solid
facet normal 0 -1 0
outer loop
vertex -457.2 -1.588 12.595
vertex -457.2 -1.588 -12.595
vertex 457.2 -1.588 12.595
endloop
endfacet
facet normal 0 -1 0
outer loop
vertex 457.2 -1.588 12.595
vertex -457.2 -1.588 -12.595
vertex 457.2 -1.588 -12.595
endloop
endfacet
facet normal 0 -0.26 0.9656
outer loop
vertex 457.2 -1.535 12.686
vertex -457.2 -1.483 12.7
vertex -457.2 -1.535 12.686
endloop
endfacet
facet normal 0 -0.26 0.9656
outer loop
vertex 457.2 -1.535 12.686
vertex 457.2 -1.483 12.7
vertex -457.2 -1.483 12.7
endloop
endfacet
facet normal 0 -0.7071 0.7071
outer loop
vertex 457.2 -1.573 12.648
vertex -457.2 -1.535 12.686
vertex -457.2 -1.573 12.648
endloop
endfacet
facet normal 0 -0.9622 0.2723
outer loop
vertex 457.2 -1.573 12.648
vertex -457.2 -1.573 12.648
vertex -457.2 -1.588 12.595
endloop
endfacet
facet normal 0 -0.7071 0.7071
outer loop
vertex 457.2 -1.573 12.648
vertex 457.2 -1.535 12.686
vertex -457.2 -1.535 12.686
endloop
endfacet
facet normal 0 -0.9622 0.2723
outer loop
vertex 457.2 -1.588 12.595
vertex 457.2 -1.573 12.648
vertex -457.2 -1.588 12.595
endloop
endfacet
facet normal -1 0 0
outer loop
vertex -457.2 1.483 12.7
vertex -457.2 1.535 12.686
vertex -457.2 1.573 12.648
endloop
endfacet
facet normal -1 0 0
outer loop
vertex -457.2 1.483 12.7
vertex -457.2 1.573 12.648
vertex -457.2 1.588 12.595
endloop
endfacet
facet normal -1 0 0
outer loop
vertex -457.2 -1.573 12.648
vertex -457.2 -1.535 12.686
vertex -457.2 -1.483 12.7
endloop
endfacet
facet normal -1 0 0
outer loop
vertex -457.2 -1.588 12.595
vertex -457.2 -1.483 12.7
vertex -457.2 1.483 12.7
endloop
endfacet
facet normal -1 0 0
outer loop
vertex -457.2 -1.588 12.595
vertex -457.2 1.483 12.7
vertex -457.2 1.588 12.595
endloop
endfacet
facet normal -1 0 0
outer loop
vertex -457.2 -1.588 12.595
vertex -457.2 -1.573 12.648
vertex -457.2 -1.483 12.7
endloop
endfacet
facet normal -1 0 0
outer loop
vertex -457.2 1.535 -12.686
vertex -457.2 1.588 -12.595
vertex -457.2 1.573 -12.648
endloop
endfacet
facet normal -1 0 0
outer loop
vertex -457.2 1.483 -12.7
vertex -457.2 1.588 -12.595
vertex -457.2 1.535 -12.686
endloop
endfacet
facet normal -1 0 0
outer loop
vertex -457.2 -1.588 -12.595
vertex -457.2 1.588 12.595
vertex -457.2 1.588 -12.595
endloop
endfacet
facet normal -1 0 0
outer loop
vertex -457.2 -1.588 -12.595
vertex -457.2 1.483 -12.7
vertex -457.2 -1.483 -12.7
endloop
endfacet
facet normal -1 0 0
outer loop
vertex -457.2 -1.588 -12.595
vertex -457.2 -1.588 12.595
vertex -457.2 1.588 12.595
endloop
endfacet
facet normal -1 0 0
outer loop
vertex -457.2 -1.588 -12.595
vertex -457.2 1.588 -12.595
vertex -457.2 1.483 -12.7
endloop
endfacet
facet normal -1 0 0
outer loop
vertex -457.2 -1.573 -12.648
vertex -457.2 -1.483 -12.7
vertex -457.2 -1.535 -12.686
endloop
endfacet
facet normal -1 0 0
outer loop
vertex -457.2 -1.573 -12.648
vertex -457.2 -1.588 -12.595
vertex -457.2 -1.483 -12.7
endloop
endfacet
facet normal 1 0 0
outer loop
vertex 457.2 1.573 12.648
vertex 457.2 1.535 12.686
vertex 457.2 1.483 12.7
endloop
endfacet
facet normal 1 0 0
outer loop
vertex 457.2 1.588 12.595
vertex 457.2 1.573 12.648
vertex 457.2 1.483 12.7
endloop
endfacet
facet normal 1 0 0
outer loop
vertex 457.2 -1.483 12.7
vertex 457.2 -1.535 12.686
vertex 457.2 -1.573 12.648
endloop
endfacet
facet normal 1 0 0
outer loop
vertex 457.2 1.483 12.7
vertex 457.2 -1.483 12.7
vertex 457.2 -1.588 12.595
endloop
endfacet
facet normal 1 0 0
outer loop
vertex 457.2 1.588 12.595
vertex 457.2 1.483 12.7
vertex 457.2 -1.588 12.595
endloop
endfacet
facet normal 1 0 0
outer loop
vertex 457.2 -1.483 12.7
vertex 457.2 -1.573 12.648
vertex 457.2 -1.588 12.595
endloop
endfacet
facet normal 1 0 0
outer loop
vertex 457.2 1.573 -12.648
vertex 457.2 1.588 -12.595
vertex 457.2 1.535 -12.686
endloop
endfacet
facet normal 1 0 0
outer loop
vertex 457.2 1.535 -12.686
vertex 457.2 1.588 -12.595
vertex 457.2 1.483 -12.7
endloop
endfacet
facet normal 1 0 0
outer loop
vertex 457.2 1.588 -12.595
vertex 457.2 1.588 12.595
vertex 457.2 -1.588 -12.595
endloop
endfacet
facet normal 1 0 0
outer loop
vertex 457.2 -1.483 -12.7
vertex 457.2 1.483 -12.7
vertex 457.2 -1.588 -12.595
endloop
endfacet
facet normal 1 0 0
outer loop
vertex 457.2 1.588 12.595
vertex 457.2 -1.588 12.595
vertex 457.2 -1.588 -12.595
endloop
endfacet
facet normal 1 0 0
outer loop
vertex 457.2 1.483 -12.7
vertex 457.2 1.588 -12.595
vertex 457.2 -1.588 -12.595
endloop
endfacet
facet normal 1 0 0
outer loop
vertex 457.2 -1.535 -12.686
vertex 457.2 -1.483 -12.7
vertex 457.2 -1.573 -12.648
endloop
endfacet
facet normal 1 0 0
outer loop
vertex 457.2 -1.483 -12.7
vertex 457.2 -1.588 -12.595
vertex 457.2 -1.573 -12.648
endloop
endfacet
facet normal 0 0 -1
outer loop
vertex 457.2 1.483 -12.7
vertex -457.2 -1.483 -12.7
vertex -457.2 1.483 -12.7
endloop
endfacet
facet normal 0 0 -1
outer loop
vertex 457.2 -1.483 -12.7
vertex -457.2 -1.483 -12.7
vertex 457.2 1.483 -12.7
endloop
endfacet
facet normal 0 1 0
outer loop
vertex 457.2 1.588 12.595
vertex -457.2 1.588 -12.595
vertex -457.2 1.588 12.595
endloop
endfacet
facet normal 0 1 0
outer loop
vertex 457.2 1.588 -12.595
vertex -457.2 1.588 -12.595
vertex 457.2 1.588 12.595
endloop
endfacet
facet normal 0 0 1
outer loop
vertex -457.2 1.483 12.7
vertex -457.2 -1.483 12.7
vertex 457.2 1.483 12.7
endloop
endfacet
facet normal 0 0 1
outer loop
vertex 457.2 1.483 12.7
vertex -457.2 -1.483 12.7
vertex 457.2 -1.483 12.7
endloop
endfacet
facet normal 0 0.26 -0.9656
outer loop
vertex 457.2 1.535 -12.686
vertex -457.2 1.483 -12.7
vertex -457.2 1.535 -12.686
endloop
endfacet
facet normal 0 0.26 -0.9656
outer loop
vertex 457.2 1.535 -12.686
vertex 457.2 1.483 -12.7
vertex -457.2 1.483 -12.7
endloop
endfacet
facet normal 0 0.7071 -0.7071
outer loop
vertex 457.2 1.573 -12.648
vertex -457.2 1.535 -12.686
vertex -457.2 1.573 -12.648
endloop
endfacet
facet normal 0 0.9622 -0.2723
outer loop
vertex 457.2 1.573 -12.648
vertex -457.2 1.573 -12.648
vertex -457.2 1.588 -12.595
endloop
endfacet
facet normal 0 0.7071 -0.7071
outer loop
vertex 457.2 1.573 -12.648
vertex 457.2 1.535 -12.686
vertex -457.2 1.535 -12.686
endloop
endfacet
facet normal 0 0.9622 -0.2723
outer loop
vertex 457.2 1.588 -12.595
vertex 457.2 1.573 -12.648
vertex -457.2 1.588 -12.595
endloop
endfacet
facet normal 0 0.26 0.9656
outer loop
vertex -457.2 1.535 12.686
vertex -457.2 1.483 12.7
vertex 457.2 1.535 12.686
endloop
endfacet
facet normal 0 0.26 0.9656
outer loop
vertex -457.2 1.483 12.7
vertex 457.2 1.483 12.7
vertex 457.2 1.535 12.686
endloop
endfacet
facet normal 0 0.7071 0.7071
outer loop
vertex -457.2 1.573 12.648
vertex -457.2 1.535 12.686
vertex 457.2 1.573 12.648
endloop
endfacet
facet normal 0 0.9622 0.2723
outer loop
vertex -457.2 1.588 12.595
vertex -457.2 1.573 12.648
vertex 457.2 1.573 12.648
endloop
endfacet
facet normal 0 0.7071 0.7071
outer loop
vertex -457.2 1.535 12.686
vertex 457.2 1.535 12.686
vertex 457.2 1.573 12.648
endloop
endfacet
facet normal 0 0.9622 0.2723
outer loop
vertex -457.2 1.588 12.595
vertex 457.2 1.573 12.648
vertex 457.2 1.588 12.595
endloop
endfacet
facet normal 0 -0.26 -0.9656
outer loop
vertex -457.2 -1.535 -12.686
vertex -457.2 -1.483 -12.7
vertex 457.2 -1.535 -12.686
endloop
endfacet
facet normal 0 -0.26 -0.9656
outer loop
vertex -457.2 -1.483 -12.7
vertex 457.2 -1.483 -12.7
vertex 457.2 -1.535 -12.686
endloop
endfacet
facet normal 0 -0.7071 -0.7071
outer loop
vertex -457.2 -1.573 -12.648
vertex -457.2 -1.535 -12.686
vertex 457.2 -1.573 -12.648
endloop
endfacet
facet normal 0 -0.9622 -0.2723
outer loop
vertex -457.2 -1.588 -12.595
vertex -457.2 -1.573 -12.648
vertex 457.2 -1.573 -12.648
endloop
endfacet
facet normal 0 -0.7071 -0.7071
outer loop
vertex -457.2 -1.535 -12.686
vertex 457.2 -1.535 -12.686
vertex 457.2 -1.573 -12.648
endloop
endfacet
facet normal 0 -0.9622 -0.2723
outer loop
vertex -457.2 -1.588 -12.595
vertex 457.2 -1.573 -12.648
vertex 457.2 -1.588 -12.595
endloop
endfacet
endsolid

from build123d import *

# Parameters (mm, degrees)
BOSS_EXTRUDE1_DEPTH      = 1.5875
BOSS_EXTRUDE1_DEPTH_BACK = 1.5875
SKETCH3_W                = 914.4
SKETCH3_H                = 25.4
FILLET1_R                = 0.104775


with BuildPart() as part:
    # Sketch3 → Boss-Extrude1 (new, two sides: drawn at the far end of the back side and taken through both)
    with BuildSketch(Plane(origin=(0, 0, 0), x_dir=(1, 0, 0), z_dir=(0, 1, 0)).offset(-BOSS_EXTRUDE1_DEPTH_BACK)):
        Rectangle(SKETCH3_W, SKETCH3_H)
    extrude(amount=BOSS_EXTRUDE1_DEPTH + BOSS_EXTRUDE1_DEPTH_BACK)

    # Fillet1
    fillet1_edges = [part.edges().sort_by_distance(p)[0] for p in [
        (0, 1.5875, 12.7),
        (0, -1.5875, -12.7),
        (0, 1.5875, -12.7),
        (0, -1.5875, 12.7),
    ]]
    fillet(fillet1_edges, radius=FILLET1_R)


solid = part.part
